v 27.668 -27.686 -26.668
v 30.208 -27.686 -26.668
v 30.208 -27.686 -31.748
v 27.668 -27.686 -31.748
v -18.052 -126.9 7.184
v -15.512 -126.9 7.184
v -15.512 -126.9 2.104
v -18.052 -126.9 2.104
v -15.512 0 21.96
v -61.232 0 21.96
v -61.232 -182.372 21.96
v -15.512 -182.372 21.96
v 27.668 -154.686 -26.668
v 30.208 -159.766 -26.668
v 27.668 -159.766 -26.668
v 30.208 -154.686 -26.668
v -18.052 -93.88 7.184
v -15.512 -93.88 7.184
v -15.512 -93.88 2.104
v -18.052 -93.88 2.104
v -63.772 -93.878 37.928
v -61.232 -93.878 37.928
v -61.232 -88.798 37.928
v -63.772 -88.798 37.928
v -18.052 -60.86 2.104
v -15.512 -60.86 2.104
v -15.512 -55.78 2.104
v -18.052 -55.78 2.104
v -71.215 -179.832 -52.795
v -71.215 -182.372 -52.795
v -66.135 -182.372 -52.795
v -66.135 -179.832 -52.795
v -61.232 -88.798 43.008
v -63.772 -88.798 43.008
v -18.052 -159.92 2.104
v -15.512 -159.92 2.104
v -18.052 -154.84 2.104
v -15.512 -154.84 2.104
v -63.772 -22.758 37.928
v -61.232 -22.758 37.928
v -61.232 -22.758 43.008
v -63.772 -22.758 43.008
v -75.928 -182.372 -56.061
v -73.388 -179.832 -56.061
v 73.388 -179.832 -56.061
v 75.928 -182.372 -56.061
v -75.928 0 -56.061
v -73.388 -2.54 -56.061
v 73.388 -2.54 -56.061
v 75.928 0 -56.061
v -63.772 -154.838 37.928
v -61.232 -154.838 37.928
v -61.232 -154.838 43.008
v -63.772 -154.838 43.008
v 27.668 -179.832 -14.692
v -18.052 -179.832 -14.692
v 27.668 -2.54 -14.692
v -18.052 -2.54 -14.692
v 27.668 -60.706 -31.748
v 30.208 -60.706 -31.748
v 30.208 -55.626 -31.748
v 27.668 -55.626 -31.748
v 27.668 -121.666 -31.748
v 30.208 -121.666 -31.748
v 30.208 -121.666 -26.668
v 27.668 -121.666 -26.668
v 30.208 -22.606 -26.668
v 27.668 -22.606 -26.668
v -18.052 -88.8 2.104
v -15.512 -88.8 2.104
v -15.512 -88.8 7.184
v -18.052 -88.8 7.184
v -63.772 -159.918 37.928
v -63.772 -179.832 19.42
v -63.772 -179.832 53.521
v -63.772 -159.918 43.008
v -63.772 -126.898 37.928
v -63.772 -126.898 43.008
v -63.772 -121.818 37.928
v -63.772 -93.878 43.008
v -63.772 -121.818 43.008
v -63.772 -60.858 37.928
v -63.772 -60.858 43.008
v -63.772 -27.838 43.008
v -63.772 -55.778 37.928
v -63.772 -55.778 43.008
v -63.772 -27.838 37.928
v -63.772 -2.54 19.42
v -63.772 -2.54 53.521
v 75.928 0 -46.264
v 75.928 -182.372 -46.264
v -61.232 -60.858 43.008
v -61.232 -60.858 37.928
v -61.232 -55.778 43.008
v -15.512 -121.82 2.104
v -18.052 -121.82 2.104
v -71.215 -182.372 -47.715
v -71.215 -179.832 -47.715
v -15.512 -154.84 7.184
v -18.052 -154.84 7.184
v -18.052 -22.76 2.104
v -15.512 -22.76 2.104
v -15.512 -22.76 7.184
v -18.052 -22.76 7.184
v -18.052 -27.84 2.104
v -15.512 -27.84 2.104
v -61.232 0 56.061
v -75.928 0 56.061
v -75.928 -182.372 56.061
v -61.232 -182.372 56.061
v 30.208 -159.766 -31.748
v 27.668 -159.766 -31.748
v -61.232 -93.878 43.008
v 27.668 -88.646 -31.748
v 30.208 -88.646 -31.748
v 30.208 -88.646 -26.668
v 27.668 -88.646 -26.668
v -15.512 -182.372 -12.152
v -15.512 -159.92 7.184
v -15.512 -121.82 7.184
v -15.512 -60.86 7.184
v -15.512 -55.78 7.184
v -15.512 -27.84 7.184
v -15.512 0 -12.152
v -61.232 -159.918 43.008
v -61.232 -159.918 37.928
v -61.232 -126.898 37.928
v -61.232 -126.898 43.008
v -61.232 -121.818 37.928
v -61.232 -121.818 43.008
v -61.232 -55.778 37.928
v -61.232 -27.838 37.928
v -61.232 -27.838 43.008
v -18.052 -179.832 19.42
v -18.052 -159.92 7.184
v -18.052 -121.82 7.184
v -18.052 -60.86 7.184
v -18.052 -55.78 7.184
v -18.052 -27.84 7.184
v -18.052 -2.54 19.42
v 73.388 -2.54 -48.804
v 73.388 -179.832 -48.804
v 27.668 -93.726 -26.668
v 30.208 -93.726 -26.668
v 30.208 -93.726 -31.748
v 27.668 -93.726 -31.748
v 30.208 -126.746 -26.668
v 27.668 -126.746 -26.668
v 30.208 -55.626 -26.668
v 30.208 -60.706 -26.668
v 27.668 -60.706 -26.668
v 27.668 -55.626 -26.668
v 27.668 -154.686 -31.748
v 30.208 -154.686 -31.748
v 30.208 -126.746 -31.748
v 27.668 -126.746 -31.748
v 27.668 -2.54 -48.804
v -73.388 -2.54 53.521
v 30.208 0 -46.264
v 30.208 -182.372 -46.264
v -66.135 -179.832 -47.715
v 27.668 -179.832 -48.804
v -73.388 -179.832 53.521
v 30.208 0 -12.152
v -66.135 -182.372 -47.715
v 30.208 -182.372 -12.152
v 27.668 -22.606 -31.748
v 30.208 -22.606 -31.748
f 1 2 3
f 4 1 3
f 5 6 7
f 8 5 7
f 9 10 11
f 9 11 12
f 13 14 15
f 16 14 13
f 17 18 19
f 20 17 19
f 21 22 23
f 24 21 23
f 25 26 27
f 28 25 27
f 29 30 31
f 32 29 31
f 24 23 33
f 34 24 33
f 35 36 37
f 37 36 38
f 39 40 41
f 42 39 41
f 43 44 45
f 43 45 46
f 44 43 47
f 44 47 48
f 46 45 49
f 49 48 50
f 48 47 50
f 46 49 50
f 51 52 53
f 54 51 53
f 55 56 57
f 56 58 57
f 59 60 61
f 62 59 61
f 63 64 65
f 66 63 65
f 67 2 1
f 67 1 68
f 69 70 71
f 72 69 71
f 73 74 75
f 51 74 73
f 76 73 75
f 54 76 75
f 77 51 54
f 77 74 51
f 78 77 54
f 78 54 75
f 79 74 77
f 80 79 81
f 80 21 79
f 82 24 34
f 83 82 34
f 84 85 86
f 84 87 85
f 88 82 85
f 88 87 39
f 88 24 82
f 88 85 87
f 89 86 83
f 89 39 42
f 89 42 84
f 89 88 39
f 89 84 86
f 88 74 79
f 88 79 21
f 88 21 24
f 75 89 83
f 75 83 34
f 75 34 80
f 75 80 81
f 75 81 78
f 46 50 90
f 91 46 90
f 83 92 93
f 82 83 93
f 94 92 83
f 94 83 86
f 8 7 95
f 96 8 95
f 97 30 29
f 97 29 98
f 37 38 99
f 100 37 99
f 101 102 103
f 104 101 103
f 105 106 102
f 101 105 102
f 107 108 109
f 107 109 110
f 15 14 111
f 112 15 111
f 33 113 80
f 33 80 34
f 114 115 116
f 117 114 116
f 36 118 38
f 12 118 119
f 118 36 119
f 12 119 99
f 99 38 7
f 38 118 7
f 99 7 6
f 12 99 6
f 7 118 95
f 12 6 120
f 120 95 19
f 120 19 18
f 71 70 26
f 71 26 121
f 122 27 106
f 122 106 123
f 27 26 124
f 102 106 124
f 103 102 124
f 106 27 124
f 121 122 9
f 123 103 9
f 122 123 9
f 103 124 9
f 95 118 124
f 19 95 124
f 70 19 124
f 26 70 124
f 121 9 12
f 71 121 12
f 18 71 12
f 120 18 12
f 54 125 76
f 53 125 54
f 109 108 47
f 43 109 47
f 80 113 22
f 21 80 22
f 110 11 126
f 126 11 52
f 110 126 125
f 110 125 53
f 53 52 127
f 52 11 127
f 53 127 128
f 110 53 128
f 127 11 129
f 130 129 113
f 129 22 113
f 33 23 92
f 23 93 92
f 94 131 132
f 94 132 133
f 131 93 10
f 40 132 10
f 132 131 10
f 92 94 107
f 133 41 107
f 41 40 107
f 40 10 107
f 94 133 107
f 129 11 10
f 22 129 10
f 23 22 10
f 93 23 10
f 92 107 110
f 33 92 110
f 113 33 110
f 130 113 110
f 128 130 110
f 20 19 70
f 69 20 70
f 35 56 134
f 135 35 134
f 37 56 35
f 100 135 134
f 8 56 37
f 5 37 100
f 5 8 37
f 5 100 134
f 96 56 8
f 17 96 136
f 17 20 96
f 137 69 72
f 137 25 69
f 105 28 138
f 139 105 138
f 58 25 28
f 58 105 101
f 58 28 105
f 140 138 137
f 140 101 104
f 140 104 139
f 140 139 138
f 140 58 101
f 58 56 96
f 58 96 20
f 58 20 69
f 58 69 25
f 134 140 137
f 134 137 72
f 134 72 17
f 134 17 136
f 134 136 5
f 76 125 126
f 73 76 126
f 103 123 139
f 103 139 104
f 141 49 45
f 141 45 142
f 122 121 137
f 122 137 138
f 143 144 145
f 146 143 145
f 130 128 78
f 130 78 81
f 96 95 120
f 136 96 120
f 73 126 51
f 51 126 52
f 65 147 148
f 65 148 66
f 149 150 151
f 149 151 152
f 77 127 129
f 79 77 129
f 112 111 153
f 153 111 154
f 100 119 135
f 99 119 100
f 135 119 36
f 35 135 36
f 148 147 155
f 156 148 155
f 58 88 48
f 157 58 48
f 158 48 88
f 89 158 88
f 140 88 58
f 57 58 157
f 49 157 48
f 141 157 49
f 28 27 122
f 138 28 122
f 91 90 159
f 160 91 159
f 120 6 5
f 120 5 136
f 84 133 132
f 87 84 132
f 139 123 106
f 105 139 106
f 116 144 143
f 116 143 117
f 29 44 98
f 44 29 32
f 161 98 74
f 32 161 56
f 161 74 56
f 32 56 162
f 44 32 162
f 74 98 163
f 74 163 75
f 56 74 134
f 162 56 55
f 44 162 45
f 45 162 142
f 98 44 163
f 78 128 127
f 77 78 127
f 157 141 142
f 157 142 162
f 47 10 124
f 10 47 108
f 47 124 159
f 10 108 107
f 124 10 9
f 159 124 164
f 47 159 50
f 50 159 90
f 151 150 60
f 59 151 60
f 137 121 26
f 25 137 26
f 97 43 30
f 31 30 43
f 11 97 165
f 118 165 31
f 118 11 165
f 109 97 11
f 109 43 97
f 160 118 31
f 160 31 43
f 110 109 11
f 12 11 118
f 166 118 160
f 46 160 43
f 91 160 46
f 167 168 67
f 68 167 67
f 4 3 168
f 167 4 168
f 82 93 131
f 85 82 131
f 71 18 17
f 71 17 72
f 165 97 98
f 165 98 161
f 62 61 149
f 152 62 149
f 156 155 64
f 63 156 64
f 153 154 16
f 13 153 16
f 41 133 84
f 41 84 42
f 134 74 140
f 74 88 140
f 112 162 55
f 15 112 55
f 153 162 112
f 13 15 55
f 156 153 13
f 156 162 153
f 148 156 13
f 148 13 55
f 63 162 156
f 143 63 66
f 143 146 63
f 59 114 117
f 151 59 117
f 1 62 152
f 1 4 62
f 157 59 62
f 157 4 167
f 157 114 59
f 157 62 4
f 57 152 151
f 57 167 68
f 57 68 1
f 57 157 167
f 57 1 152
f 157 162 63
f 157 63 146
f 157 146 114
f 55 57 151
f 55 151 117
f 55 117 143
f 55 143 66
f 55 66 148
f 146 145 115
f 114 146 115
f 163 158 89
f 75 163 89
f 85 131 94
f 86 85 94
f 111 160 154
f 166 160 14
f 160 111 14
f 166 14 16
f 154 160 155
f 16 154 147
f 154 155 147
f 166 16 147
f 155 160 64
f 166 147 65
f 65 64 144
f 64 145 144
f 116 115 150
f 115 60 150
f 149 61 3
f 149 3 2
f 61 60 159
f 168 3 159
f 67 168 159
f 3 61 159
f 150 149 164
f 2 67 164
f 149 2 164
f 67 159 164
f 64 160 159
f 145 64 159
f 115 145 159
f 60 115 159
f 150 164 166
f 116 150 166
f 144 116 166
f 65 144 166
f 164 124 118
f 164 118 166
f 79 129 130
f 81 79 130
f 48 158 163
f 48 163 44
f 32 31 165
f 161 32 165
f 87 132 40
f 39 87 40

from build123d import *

# Parameters (mm, degrees)
F0_W      = 14.6957188845
F0_H      = 34.1013113993
F0_W_2    = 45.72
F0_H_2    = 34.1122
F0_H_3    = 9.7971446812
F0_W_3    = 45.7200031853
F1_DEPTH  = 182.372
F2_T      = -2.54
F3_W      = 5.08
F3_H      = 2.54
F4_DEPTH  = 25.4
F5_W      = 5.08
F5_H      = 5.08
F6_DEPTH  = 25.4
F7_W      = 5.08
F7_H      = 2.54
F8_DEPTH  = 25.4
F9_W      = 5.08
F9_H      = 2.54
F10_DEPTH = 10.3632


with BuildPart() as f1:
    # F0 (on Front) → F1 (new body)
    with BuildSketch(Plane.XZ):
        with Locations((-68.5800015926, 39.0107723406)):
            Rectangle(F0_W, F0_H)
        with Locations((-38.3721421504, 4.9040166409)):
            Rectangle(F0_W_2, F0_H_2)
        with Locations((-68.5800015926, 4.9040166409)):
            Rectangle(F0_W, F0_H_2)
        with Locations((-68.5800015926, -29.2081833591)):
            Rectangle(F0_W, F0_H_2)
        with Locations((-68.5800015926, -51.1628556997)):
            Rectangle(F0_W, F0_H_3)
        with Locations((-38.3721421504, -29.2081833591)):
            Rectangle(F0_W_2, F0_H_2)
        with Locations((-38.3721421504, -51.1628556997)):
            Rectangle(F0_W_2, F0_H_3)
        with Locations((7.3478594422, -51.1628556997)):
            Rectangle(F0_W_3, F0_H_3)
        with Locations((53.0678610349, -51.1628556997)):
            Rectangle(F0_W_2, F0_H_3)
        with Locations((7.3478594422, -29.2081833591)):
            Rectangle(F0_W_3, F0_H_2)
    extrude(amount=F1_DEPTH)

    # F2
    f2_openings = [f1.faces().sort_by_distance(p)[0] for p in [
        (0, -91.186, -56.061428),
    ]]
    offset(amount=F2_T, openings=f2_openings, kind=Kind.INTERSECTION)

    # F3 (on face) → F4 (cut)
    with BuildSketch(Plane.YZ.offset(30.2078610349)):
        with Locations((-157.226, -27.9381833591)):
            Rectangle(F3_W, F3_H)
        with Locations((-157.226, -30.4781833591)):
            Rectangle(F3_W, F3_H)
        with Locations((-124.206, -30.4781833591)):
            Rectangle(F3_W, F3_H)
        with Locations((-124.206, -27.9381833591)):
            Rectangle(F3_W, F3_H)
        with Locations((-91.186, -30.4781833591)):
            Rectangle(F3_W, F3_H)
        with Locations((-91.186, -27.9381833591)):
            Rectangle(F3_W, F3_H)
        with Locations((-58.166, -30.4781833591)):
            Rectangle(F3_W, F3_H)
        with Locations((-58.166, -27.9381833591)):
            Rectangle(F3_W, F3_H)
        with Locations((-25.146, -27.9381833591)):
            Rectangle(F3_W, F3_H)
        with Locations((-25.146, -30.4781833591)):
            Rectangle(F3_W, F3_H)
    extrude(amount=-F4_DEPTH, mode=Mode.SUBTRACT)

    # F5 (on face) → F6 (cut)
    with BuildSketch(Plane.XZ.offset(182.372)):
        with Locations((-68.675249815, -50.2550639212)):
            Rectangle(F5_W, F5_H)
    extrude(amount=-F6_DEPTH, mode=Mode.SUBTRACT)

    # F7 (on face) → F8 (cut)
    with BuildSketch(Plane.YZ.offset(-15.5121421504)):
        with Locations((-157.3796552205, 5.9143330357)):
            Rectangle(F7_W, F7_H)
        with Locations((-157.3796552205, 3.3743330357)):
            Rectangle(F7_W, F7_H)
        with Locations((-124.3596552205, 5.9143330357)):
            Rectangle(F7_W, F7_H)
        with Locations((-124.3596552205, 3.3743330357)):
            Rectangle(F7_W, F7_H)
        with Locations((-91.3396552205, 5.9143330357)):
            Rectangle(F7_W, F7_H)
        with Locations((-91.3396552205, 3.3743330357)):
            Rectangle(F7_W, F7_H)
        with Locations((-58.3196552205, 5.9143330357)):
            Rectangle(F7_W, F7_H)
        with Locations((-58.3196552205, 3.3743330357)):
            Rectangle(F7_W, F7_H)
        with Locations((-25.2996552205, 5.9143330357)):
            Rectangle(F7_W, F7_H)
        with Locations((-25.2996552205, 3.3743330357)):
            Rectangle(F7_W, F7_H)
    extrude(amount=-F8_DEPTH, mode=Mode.SUBTRACT)

    # F9 (on face) → F10 (cut)
    with BuildSketch(Plane.YZ.offset(-61.2321421504)):
        with Locations((-157.3776137614, 41.7377093029)):
            Rectangle(F9_W, F9_H)
        with Locations((-157.3776137614, 39.1977093029)):
            Rectangle(F9_W, F9_H)
        with Locations((-124.3576137614, 41.7377093029)):
            Rectangle(F9_W, F9_H)
        with Locations((-124.3576137614, 39.1977093029)):
            Rectangle(F9_W, F9_H)
        with Locations((-91.3376137614, 41.7377093029)):
            Rectangle(F9_W, F9_H)
        with Locations((-91.3376137614, 39.1977093029)):
            Rectangle(F9_W, F9_H)
        with Locations((-58.3176137614, 41.7377093029)):
            Rectangle(F9_W, F9_H)
        with Locations((-58.3176137614, 39.1977093029)):
            Rectangle(F9_W, F9_H)
        with Locations((-25.2976137614, 41.7377093029)):
            Rectangle(F9_W, F9_H)
        with Locations((-25.2976137614, 39.1977093029)):
            Rectangle(F9_W, F9_H)
    extrude(amount=-F10_DEPTH, mode=Mode.SUBTRACT)


solid = f1.part
